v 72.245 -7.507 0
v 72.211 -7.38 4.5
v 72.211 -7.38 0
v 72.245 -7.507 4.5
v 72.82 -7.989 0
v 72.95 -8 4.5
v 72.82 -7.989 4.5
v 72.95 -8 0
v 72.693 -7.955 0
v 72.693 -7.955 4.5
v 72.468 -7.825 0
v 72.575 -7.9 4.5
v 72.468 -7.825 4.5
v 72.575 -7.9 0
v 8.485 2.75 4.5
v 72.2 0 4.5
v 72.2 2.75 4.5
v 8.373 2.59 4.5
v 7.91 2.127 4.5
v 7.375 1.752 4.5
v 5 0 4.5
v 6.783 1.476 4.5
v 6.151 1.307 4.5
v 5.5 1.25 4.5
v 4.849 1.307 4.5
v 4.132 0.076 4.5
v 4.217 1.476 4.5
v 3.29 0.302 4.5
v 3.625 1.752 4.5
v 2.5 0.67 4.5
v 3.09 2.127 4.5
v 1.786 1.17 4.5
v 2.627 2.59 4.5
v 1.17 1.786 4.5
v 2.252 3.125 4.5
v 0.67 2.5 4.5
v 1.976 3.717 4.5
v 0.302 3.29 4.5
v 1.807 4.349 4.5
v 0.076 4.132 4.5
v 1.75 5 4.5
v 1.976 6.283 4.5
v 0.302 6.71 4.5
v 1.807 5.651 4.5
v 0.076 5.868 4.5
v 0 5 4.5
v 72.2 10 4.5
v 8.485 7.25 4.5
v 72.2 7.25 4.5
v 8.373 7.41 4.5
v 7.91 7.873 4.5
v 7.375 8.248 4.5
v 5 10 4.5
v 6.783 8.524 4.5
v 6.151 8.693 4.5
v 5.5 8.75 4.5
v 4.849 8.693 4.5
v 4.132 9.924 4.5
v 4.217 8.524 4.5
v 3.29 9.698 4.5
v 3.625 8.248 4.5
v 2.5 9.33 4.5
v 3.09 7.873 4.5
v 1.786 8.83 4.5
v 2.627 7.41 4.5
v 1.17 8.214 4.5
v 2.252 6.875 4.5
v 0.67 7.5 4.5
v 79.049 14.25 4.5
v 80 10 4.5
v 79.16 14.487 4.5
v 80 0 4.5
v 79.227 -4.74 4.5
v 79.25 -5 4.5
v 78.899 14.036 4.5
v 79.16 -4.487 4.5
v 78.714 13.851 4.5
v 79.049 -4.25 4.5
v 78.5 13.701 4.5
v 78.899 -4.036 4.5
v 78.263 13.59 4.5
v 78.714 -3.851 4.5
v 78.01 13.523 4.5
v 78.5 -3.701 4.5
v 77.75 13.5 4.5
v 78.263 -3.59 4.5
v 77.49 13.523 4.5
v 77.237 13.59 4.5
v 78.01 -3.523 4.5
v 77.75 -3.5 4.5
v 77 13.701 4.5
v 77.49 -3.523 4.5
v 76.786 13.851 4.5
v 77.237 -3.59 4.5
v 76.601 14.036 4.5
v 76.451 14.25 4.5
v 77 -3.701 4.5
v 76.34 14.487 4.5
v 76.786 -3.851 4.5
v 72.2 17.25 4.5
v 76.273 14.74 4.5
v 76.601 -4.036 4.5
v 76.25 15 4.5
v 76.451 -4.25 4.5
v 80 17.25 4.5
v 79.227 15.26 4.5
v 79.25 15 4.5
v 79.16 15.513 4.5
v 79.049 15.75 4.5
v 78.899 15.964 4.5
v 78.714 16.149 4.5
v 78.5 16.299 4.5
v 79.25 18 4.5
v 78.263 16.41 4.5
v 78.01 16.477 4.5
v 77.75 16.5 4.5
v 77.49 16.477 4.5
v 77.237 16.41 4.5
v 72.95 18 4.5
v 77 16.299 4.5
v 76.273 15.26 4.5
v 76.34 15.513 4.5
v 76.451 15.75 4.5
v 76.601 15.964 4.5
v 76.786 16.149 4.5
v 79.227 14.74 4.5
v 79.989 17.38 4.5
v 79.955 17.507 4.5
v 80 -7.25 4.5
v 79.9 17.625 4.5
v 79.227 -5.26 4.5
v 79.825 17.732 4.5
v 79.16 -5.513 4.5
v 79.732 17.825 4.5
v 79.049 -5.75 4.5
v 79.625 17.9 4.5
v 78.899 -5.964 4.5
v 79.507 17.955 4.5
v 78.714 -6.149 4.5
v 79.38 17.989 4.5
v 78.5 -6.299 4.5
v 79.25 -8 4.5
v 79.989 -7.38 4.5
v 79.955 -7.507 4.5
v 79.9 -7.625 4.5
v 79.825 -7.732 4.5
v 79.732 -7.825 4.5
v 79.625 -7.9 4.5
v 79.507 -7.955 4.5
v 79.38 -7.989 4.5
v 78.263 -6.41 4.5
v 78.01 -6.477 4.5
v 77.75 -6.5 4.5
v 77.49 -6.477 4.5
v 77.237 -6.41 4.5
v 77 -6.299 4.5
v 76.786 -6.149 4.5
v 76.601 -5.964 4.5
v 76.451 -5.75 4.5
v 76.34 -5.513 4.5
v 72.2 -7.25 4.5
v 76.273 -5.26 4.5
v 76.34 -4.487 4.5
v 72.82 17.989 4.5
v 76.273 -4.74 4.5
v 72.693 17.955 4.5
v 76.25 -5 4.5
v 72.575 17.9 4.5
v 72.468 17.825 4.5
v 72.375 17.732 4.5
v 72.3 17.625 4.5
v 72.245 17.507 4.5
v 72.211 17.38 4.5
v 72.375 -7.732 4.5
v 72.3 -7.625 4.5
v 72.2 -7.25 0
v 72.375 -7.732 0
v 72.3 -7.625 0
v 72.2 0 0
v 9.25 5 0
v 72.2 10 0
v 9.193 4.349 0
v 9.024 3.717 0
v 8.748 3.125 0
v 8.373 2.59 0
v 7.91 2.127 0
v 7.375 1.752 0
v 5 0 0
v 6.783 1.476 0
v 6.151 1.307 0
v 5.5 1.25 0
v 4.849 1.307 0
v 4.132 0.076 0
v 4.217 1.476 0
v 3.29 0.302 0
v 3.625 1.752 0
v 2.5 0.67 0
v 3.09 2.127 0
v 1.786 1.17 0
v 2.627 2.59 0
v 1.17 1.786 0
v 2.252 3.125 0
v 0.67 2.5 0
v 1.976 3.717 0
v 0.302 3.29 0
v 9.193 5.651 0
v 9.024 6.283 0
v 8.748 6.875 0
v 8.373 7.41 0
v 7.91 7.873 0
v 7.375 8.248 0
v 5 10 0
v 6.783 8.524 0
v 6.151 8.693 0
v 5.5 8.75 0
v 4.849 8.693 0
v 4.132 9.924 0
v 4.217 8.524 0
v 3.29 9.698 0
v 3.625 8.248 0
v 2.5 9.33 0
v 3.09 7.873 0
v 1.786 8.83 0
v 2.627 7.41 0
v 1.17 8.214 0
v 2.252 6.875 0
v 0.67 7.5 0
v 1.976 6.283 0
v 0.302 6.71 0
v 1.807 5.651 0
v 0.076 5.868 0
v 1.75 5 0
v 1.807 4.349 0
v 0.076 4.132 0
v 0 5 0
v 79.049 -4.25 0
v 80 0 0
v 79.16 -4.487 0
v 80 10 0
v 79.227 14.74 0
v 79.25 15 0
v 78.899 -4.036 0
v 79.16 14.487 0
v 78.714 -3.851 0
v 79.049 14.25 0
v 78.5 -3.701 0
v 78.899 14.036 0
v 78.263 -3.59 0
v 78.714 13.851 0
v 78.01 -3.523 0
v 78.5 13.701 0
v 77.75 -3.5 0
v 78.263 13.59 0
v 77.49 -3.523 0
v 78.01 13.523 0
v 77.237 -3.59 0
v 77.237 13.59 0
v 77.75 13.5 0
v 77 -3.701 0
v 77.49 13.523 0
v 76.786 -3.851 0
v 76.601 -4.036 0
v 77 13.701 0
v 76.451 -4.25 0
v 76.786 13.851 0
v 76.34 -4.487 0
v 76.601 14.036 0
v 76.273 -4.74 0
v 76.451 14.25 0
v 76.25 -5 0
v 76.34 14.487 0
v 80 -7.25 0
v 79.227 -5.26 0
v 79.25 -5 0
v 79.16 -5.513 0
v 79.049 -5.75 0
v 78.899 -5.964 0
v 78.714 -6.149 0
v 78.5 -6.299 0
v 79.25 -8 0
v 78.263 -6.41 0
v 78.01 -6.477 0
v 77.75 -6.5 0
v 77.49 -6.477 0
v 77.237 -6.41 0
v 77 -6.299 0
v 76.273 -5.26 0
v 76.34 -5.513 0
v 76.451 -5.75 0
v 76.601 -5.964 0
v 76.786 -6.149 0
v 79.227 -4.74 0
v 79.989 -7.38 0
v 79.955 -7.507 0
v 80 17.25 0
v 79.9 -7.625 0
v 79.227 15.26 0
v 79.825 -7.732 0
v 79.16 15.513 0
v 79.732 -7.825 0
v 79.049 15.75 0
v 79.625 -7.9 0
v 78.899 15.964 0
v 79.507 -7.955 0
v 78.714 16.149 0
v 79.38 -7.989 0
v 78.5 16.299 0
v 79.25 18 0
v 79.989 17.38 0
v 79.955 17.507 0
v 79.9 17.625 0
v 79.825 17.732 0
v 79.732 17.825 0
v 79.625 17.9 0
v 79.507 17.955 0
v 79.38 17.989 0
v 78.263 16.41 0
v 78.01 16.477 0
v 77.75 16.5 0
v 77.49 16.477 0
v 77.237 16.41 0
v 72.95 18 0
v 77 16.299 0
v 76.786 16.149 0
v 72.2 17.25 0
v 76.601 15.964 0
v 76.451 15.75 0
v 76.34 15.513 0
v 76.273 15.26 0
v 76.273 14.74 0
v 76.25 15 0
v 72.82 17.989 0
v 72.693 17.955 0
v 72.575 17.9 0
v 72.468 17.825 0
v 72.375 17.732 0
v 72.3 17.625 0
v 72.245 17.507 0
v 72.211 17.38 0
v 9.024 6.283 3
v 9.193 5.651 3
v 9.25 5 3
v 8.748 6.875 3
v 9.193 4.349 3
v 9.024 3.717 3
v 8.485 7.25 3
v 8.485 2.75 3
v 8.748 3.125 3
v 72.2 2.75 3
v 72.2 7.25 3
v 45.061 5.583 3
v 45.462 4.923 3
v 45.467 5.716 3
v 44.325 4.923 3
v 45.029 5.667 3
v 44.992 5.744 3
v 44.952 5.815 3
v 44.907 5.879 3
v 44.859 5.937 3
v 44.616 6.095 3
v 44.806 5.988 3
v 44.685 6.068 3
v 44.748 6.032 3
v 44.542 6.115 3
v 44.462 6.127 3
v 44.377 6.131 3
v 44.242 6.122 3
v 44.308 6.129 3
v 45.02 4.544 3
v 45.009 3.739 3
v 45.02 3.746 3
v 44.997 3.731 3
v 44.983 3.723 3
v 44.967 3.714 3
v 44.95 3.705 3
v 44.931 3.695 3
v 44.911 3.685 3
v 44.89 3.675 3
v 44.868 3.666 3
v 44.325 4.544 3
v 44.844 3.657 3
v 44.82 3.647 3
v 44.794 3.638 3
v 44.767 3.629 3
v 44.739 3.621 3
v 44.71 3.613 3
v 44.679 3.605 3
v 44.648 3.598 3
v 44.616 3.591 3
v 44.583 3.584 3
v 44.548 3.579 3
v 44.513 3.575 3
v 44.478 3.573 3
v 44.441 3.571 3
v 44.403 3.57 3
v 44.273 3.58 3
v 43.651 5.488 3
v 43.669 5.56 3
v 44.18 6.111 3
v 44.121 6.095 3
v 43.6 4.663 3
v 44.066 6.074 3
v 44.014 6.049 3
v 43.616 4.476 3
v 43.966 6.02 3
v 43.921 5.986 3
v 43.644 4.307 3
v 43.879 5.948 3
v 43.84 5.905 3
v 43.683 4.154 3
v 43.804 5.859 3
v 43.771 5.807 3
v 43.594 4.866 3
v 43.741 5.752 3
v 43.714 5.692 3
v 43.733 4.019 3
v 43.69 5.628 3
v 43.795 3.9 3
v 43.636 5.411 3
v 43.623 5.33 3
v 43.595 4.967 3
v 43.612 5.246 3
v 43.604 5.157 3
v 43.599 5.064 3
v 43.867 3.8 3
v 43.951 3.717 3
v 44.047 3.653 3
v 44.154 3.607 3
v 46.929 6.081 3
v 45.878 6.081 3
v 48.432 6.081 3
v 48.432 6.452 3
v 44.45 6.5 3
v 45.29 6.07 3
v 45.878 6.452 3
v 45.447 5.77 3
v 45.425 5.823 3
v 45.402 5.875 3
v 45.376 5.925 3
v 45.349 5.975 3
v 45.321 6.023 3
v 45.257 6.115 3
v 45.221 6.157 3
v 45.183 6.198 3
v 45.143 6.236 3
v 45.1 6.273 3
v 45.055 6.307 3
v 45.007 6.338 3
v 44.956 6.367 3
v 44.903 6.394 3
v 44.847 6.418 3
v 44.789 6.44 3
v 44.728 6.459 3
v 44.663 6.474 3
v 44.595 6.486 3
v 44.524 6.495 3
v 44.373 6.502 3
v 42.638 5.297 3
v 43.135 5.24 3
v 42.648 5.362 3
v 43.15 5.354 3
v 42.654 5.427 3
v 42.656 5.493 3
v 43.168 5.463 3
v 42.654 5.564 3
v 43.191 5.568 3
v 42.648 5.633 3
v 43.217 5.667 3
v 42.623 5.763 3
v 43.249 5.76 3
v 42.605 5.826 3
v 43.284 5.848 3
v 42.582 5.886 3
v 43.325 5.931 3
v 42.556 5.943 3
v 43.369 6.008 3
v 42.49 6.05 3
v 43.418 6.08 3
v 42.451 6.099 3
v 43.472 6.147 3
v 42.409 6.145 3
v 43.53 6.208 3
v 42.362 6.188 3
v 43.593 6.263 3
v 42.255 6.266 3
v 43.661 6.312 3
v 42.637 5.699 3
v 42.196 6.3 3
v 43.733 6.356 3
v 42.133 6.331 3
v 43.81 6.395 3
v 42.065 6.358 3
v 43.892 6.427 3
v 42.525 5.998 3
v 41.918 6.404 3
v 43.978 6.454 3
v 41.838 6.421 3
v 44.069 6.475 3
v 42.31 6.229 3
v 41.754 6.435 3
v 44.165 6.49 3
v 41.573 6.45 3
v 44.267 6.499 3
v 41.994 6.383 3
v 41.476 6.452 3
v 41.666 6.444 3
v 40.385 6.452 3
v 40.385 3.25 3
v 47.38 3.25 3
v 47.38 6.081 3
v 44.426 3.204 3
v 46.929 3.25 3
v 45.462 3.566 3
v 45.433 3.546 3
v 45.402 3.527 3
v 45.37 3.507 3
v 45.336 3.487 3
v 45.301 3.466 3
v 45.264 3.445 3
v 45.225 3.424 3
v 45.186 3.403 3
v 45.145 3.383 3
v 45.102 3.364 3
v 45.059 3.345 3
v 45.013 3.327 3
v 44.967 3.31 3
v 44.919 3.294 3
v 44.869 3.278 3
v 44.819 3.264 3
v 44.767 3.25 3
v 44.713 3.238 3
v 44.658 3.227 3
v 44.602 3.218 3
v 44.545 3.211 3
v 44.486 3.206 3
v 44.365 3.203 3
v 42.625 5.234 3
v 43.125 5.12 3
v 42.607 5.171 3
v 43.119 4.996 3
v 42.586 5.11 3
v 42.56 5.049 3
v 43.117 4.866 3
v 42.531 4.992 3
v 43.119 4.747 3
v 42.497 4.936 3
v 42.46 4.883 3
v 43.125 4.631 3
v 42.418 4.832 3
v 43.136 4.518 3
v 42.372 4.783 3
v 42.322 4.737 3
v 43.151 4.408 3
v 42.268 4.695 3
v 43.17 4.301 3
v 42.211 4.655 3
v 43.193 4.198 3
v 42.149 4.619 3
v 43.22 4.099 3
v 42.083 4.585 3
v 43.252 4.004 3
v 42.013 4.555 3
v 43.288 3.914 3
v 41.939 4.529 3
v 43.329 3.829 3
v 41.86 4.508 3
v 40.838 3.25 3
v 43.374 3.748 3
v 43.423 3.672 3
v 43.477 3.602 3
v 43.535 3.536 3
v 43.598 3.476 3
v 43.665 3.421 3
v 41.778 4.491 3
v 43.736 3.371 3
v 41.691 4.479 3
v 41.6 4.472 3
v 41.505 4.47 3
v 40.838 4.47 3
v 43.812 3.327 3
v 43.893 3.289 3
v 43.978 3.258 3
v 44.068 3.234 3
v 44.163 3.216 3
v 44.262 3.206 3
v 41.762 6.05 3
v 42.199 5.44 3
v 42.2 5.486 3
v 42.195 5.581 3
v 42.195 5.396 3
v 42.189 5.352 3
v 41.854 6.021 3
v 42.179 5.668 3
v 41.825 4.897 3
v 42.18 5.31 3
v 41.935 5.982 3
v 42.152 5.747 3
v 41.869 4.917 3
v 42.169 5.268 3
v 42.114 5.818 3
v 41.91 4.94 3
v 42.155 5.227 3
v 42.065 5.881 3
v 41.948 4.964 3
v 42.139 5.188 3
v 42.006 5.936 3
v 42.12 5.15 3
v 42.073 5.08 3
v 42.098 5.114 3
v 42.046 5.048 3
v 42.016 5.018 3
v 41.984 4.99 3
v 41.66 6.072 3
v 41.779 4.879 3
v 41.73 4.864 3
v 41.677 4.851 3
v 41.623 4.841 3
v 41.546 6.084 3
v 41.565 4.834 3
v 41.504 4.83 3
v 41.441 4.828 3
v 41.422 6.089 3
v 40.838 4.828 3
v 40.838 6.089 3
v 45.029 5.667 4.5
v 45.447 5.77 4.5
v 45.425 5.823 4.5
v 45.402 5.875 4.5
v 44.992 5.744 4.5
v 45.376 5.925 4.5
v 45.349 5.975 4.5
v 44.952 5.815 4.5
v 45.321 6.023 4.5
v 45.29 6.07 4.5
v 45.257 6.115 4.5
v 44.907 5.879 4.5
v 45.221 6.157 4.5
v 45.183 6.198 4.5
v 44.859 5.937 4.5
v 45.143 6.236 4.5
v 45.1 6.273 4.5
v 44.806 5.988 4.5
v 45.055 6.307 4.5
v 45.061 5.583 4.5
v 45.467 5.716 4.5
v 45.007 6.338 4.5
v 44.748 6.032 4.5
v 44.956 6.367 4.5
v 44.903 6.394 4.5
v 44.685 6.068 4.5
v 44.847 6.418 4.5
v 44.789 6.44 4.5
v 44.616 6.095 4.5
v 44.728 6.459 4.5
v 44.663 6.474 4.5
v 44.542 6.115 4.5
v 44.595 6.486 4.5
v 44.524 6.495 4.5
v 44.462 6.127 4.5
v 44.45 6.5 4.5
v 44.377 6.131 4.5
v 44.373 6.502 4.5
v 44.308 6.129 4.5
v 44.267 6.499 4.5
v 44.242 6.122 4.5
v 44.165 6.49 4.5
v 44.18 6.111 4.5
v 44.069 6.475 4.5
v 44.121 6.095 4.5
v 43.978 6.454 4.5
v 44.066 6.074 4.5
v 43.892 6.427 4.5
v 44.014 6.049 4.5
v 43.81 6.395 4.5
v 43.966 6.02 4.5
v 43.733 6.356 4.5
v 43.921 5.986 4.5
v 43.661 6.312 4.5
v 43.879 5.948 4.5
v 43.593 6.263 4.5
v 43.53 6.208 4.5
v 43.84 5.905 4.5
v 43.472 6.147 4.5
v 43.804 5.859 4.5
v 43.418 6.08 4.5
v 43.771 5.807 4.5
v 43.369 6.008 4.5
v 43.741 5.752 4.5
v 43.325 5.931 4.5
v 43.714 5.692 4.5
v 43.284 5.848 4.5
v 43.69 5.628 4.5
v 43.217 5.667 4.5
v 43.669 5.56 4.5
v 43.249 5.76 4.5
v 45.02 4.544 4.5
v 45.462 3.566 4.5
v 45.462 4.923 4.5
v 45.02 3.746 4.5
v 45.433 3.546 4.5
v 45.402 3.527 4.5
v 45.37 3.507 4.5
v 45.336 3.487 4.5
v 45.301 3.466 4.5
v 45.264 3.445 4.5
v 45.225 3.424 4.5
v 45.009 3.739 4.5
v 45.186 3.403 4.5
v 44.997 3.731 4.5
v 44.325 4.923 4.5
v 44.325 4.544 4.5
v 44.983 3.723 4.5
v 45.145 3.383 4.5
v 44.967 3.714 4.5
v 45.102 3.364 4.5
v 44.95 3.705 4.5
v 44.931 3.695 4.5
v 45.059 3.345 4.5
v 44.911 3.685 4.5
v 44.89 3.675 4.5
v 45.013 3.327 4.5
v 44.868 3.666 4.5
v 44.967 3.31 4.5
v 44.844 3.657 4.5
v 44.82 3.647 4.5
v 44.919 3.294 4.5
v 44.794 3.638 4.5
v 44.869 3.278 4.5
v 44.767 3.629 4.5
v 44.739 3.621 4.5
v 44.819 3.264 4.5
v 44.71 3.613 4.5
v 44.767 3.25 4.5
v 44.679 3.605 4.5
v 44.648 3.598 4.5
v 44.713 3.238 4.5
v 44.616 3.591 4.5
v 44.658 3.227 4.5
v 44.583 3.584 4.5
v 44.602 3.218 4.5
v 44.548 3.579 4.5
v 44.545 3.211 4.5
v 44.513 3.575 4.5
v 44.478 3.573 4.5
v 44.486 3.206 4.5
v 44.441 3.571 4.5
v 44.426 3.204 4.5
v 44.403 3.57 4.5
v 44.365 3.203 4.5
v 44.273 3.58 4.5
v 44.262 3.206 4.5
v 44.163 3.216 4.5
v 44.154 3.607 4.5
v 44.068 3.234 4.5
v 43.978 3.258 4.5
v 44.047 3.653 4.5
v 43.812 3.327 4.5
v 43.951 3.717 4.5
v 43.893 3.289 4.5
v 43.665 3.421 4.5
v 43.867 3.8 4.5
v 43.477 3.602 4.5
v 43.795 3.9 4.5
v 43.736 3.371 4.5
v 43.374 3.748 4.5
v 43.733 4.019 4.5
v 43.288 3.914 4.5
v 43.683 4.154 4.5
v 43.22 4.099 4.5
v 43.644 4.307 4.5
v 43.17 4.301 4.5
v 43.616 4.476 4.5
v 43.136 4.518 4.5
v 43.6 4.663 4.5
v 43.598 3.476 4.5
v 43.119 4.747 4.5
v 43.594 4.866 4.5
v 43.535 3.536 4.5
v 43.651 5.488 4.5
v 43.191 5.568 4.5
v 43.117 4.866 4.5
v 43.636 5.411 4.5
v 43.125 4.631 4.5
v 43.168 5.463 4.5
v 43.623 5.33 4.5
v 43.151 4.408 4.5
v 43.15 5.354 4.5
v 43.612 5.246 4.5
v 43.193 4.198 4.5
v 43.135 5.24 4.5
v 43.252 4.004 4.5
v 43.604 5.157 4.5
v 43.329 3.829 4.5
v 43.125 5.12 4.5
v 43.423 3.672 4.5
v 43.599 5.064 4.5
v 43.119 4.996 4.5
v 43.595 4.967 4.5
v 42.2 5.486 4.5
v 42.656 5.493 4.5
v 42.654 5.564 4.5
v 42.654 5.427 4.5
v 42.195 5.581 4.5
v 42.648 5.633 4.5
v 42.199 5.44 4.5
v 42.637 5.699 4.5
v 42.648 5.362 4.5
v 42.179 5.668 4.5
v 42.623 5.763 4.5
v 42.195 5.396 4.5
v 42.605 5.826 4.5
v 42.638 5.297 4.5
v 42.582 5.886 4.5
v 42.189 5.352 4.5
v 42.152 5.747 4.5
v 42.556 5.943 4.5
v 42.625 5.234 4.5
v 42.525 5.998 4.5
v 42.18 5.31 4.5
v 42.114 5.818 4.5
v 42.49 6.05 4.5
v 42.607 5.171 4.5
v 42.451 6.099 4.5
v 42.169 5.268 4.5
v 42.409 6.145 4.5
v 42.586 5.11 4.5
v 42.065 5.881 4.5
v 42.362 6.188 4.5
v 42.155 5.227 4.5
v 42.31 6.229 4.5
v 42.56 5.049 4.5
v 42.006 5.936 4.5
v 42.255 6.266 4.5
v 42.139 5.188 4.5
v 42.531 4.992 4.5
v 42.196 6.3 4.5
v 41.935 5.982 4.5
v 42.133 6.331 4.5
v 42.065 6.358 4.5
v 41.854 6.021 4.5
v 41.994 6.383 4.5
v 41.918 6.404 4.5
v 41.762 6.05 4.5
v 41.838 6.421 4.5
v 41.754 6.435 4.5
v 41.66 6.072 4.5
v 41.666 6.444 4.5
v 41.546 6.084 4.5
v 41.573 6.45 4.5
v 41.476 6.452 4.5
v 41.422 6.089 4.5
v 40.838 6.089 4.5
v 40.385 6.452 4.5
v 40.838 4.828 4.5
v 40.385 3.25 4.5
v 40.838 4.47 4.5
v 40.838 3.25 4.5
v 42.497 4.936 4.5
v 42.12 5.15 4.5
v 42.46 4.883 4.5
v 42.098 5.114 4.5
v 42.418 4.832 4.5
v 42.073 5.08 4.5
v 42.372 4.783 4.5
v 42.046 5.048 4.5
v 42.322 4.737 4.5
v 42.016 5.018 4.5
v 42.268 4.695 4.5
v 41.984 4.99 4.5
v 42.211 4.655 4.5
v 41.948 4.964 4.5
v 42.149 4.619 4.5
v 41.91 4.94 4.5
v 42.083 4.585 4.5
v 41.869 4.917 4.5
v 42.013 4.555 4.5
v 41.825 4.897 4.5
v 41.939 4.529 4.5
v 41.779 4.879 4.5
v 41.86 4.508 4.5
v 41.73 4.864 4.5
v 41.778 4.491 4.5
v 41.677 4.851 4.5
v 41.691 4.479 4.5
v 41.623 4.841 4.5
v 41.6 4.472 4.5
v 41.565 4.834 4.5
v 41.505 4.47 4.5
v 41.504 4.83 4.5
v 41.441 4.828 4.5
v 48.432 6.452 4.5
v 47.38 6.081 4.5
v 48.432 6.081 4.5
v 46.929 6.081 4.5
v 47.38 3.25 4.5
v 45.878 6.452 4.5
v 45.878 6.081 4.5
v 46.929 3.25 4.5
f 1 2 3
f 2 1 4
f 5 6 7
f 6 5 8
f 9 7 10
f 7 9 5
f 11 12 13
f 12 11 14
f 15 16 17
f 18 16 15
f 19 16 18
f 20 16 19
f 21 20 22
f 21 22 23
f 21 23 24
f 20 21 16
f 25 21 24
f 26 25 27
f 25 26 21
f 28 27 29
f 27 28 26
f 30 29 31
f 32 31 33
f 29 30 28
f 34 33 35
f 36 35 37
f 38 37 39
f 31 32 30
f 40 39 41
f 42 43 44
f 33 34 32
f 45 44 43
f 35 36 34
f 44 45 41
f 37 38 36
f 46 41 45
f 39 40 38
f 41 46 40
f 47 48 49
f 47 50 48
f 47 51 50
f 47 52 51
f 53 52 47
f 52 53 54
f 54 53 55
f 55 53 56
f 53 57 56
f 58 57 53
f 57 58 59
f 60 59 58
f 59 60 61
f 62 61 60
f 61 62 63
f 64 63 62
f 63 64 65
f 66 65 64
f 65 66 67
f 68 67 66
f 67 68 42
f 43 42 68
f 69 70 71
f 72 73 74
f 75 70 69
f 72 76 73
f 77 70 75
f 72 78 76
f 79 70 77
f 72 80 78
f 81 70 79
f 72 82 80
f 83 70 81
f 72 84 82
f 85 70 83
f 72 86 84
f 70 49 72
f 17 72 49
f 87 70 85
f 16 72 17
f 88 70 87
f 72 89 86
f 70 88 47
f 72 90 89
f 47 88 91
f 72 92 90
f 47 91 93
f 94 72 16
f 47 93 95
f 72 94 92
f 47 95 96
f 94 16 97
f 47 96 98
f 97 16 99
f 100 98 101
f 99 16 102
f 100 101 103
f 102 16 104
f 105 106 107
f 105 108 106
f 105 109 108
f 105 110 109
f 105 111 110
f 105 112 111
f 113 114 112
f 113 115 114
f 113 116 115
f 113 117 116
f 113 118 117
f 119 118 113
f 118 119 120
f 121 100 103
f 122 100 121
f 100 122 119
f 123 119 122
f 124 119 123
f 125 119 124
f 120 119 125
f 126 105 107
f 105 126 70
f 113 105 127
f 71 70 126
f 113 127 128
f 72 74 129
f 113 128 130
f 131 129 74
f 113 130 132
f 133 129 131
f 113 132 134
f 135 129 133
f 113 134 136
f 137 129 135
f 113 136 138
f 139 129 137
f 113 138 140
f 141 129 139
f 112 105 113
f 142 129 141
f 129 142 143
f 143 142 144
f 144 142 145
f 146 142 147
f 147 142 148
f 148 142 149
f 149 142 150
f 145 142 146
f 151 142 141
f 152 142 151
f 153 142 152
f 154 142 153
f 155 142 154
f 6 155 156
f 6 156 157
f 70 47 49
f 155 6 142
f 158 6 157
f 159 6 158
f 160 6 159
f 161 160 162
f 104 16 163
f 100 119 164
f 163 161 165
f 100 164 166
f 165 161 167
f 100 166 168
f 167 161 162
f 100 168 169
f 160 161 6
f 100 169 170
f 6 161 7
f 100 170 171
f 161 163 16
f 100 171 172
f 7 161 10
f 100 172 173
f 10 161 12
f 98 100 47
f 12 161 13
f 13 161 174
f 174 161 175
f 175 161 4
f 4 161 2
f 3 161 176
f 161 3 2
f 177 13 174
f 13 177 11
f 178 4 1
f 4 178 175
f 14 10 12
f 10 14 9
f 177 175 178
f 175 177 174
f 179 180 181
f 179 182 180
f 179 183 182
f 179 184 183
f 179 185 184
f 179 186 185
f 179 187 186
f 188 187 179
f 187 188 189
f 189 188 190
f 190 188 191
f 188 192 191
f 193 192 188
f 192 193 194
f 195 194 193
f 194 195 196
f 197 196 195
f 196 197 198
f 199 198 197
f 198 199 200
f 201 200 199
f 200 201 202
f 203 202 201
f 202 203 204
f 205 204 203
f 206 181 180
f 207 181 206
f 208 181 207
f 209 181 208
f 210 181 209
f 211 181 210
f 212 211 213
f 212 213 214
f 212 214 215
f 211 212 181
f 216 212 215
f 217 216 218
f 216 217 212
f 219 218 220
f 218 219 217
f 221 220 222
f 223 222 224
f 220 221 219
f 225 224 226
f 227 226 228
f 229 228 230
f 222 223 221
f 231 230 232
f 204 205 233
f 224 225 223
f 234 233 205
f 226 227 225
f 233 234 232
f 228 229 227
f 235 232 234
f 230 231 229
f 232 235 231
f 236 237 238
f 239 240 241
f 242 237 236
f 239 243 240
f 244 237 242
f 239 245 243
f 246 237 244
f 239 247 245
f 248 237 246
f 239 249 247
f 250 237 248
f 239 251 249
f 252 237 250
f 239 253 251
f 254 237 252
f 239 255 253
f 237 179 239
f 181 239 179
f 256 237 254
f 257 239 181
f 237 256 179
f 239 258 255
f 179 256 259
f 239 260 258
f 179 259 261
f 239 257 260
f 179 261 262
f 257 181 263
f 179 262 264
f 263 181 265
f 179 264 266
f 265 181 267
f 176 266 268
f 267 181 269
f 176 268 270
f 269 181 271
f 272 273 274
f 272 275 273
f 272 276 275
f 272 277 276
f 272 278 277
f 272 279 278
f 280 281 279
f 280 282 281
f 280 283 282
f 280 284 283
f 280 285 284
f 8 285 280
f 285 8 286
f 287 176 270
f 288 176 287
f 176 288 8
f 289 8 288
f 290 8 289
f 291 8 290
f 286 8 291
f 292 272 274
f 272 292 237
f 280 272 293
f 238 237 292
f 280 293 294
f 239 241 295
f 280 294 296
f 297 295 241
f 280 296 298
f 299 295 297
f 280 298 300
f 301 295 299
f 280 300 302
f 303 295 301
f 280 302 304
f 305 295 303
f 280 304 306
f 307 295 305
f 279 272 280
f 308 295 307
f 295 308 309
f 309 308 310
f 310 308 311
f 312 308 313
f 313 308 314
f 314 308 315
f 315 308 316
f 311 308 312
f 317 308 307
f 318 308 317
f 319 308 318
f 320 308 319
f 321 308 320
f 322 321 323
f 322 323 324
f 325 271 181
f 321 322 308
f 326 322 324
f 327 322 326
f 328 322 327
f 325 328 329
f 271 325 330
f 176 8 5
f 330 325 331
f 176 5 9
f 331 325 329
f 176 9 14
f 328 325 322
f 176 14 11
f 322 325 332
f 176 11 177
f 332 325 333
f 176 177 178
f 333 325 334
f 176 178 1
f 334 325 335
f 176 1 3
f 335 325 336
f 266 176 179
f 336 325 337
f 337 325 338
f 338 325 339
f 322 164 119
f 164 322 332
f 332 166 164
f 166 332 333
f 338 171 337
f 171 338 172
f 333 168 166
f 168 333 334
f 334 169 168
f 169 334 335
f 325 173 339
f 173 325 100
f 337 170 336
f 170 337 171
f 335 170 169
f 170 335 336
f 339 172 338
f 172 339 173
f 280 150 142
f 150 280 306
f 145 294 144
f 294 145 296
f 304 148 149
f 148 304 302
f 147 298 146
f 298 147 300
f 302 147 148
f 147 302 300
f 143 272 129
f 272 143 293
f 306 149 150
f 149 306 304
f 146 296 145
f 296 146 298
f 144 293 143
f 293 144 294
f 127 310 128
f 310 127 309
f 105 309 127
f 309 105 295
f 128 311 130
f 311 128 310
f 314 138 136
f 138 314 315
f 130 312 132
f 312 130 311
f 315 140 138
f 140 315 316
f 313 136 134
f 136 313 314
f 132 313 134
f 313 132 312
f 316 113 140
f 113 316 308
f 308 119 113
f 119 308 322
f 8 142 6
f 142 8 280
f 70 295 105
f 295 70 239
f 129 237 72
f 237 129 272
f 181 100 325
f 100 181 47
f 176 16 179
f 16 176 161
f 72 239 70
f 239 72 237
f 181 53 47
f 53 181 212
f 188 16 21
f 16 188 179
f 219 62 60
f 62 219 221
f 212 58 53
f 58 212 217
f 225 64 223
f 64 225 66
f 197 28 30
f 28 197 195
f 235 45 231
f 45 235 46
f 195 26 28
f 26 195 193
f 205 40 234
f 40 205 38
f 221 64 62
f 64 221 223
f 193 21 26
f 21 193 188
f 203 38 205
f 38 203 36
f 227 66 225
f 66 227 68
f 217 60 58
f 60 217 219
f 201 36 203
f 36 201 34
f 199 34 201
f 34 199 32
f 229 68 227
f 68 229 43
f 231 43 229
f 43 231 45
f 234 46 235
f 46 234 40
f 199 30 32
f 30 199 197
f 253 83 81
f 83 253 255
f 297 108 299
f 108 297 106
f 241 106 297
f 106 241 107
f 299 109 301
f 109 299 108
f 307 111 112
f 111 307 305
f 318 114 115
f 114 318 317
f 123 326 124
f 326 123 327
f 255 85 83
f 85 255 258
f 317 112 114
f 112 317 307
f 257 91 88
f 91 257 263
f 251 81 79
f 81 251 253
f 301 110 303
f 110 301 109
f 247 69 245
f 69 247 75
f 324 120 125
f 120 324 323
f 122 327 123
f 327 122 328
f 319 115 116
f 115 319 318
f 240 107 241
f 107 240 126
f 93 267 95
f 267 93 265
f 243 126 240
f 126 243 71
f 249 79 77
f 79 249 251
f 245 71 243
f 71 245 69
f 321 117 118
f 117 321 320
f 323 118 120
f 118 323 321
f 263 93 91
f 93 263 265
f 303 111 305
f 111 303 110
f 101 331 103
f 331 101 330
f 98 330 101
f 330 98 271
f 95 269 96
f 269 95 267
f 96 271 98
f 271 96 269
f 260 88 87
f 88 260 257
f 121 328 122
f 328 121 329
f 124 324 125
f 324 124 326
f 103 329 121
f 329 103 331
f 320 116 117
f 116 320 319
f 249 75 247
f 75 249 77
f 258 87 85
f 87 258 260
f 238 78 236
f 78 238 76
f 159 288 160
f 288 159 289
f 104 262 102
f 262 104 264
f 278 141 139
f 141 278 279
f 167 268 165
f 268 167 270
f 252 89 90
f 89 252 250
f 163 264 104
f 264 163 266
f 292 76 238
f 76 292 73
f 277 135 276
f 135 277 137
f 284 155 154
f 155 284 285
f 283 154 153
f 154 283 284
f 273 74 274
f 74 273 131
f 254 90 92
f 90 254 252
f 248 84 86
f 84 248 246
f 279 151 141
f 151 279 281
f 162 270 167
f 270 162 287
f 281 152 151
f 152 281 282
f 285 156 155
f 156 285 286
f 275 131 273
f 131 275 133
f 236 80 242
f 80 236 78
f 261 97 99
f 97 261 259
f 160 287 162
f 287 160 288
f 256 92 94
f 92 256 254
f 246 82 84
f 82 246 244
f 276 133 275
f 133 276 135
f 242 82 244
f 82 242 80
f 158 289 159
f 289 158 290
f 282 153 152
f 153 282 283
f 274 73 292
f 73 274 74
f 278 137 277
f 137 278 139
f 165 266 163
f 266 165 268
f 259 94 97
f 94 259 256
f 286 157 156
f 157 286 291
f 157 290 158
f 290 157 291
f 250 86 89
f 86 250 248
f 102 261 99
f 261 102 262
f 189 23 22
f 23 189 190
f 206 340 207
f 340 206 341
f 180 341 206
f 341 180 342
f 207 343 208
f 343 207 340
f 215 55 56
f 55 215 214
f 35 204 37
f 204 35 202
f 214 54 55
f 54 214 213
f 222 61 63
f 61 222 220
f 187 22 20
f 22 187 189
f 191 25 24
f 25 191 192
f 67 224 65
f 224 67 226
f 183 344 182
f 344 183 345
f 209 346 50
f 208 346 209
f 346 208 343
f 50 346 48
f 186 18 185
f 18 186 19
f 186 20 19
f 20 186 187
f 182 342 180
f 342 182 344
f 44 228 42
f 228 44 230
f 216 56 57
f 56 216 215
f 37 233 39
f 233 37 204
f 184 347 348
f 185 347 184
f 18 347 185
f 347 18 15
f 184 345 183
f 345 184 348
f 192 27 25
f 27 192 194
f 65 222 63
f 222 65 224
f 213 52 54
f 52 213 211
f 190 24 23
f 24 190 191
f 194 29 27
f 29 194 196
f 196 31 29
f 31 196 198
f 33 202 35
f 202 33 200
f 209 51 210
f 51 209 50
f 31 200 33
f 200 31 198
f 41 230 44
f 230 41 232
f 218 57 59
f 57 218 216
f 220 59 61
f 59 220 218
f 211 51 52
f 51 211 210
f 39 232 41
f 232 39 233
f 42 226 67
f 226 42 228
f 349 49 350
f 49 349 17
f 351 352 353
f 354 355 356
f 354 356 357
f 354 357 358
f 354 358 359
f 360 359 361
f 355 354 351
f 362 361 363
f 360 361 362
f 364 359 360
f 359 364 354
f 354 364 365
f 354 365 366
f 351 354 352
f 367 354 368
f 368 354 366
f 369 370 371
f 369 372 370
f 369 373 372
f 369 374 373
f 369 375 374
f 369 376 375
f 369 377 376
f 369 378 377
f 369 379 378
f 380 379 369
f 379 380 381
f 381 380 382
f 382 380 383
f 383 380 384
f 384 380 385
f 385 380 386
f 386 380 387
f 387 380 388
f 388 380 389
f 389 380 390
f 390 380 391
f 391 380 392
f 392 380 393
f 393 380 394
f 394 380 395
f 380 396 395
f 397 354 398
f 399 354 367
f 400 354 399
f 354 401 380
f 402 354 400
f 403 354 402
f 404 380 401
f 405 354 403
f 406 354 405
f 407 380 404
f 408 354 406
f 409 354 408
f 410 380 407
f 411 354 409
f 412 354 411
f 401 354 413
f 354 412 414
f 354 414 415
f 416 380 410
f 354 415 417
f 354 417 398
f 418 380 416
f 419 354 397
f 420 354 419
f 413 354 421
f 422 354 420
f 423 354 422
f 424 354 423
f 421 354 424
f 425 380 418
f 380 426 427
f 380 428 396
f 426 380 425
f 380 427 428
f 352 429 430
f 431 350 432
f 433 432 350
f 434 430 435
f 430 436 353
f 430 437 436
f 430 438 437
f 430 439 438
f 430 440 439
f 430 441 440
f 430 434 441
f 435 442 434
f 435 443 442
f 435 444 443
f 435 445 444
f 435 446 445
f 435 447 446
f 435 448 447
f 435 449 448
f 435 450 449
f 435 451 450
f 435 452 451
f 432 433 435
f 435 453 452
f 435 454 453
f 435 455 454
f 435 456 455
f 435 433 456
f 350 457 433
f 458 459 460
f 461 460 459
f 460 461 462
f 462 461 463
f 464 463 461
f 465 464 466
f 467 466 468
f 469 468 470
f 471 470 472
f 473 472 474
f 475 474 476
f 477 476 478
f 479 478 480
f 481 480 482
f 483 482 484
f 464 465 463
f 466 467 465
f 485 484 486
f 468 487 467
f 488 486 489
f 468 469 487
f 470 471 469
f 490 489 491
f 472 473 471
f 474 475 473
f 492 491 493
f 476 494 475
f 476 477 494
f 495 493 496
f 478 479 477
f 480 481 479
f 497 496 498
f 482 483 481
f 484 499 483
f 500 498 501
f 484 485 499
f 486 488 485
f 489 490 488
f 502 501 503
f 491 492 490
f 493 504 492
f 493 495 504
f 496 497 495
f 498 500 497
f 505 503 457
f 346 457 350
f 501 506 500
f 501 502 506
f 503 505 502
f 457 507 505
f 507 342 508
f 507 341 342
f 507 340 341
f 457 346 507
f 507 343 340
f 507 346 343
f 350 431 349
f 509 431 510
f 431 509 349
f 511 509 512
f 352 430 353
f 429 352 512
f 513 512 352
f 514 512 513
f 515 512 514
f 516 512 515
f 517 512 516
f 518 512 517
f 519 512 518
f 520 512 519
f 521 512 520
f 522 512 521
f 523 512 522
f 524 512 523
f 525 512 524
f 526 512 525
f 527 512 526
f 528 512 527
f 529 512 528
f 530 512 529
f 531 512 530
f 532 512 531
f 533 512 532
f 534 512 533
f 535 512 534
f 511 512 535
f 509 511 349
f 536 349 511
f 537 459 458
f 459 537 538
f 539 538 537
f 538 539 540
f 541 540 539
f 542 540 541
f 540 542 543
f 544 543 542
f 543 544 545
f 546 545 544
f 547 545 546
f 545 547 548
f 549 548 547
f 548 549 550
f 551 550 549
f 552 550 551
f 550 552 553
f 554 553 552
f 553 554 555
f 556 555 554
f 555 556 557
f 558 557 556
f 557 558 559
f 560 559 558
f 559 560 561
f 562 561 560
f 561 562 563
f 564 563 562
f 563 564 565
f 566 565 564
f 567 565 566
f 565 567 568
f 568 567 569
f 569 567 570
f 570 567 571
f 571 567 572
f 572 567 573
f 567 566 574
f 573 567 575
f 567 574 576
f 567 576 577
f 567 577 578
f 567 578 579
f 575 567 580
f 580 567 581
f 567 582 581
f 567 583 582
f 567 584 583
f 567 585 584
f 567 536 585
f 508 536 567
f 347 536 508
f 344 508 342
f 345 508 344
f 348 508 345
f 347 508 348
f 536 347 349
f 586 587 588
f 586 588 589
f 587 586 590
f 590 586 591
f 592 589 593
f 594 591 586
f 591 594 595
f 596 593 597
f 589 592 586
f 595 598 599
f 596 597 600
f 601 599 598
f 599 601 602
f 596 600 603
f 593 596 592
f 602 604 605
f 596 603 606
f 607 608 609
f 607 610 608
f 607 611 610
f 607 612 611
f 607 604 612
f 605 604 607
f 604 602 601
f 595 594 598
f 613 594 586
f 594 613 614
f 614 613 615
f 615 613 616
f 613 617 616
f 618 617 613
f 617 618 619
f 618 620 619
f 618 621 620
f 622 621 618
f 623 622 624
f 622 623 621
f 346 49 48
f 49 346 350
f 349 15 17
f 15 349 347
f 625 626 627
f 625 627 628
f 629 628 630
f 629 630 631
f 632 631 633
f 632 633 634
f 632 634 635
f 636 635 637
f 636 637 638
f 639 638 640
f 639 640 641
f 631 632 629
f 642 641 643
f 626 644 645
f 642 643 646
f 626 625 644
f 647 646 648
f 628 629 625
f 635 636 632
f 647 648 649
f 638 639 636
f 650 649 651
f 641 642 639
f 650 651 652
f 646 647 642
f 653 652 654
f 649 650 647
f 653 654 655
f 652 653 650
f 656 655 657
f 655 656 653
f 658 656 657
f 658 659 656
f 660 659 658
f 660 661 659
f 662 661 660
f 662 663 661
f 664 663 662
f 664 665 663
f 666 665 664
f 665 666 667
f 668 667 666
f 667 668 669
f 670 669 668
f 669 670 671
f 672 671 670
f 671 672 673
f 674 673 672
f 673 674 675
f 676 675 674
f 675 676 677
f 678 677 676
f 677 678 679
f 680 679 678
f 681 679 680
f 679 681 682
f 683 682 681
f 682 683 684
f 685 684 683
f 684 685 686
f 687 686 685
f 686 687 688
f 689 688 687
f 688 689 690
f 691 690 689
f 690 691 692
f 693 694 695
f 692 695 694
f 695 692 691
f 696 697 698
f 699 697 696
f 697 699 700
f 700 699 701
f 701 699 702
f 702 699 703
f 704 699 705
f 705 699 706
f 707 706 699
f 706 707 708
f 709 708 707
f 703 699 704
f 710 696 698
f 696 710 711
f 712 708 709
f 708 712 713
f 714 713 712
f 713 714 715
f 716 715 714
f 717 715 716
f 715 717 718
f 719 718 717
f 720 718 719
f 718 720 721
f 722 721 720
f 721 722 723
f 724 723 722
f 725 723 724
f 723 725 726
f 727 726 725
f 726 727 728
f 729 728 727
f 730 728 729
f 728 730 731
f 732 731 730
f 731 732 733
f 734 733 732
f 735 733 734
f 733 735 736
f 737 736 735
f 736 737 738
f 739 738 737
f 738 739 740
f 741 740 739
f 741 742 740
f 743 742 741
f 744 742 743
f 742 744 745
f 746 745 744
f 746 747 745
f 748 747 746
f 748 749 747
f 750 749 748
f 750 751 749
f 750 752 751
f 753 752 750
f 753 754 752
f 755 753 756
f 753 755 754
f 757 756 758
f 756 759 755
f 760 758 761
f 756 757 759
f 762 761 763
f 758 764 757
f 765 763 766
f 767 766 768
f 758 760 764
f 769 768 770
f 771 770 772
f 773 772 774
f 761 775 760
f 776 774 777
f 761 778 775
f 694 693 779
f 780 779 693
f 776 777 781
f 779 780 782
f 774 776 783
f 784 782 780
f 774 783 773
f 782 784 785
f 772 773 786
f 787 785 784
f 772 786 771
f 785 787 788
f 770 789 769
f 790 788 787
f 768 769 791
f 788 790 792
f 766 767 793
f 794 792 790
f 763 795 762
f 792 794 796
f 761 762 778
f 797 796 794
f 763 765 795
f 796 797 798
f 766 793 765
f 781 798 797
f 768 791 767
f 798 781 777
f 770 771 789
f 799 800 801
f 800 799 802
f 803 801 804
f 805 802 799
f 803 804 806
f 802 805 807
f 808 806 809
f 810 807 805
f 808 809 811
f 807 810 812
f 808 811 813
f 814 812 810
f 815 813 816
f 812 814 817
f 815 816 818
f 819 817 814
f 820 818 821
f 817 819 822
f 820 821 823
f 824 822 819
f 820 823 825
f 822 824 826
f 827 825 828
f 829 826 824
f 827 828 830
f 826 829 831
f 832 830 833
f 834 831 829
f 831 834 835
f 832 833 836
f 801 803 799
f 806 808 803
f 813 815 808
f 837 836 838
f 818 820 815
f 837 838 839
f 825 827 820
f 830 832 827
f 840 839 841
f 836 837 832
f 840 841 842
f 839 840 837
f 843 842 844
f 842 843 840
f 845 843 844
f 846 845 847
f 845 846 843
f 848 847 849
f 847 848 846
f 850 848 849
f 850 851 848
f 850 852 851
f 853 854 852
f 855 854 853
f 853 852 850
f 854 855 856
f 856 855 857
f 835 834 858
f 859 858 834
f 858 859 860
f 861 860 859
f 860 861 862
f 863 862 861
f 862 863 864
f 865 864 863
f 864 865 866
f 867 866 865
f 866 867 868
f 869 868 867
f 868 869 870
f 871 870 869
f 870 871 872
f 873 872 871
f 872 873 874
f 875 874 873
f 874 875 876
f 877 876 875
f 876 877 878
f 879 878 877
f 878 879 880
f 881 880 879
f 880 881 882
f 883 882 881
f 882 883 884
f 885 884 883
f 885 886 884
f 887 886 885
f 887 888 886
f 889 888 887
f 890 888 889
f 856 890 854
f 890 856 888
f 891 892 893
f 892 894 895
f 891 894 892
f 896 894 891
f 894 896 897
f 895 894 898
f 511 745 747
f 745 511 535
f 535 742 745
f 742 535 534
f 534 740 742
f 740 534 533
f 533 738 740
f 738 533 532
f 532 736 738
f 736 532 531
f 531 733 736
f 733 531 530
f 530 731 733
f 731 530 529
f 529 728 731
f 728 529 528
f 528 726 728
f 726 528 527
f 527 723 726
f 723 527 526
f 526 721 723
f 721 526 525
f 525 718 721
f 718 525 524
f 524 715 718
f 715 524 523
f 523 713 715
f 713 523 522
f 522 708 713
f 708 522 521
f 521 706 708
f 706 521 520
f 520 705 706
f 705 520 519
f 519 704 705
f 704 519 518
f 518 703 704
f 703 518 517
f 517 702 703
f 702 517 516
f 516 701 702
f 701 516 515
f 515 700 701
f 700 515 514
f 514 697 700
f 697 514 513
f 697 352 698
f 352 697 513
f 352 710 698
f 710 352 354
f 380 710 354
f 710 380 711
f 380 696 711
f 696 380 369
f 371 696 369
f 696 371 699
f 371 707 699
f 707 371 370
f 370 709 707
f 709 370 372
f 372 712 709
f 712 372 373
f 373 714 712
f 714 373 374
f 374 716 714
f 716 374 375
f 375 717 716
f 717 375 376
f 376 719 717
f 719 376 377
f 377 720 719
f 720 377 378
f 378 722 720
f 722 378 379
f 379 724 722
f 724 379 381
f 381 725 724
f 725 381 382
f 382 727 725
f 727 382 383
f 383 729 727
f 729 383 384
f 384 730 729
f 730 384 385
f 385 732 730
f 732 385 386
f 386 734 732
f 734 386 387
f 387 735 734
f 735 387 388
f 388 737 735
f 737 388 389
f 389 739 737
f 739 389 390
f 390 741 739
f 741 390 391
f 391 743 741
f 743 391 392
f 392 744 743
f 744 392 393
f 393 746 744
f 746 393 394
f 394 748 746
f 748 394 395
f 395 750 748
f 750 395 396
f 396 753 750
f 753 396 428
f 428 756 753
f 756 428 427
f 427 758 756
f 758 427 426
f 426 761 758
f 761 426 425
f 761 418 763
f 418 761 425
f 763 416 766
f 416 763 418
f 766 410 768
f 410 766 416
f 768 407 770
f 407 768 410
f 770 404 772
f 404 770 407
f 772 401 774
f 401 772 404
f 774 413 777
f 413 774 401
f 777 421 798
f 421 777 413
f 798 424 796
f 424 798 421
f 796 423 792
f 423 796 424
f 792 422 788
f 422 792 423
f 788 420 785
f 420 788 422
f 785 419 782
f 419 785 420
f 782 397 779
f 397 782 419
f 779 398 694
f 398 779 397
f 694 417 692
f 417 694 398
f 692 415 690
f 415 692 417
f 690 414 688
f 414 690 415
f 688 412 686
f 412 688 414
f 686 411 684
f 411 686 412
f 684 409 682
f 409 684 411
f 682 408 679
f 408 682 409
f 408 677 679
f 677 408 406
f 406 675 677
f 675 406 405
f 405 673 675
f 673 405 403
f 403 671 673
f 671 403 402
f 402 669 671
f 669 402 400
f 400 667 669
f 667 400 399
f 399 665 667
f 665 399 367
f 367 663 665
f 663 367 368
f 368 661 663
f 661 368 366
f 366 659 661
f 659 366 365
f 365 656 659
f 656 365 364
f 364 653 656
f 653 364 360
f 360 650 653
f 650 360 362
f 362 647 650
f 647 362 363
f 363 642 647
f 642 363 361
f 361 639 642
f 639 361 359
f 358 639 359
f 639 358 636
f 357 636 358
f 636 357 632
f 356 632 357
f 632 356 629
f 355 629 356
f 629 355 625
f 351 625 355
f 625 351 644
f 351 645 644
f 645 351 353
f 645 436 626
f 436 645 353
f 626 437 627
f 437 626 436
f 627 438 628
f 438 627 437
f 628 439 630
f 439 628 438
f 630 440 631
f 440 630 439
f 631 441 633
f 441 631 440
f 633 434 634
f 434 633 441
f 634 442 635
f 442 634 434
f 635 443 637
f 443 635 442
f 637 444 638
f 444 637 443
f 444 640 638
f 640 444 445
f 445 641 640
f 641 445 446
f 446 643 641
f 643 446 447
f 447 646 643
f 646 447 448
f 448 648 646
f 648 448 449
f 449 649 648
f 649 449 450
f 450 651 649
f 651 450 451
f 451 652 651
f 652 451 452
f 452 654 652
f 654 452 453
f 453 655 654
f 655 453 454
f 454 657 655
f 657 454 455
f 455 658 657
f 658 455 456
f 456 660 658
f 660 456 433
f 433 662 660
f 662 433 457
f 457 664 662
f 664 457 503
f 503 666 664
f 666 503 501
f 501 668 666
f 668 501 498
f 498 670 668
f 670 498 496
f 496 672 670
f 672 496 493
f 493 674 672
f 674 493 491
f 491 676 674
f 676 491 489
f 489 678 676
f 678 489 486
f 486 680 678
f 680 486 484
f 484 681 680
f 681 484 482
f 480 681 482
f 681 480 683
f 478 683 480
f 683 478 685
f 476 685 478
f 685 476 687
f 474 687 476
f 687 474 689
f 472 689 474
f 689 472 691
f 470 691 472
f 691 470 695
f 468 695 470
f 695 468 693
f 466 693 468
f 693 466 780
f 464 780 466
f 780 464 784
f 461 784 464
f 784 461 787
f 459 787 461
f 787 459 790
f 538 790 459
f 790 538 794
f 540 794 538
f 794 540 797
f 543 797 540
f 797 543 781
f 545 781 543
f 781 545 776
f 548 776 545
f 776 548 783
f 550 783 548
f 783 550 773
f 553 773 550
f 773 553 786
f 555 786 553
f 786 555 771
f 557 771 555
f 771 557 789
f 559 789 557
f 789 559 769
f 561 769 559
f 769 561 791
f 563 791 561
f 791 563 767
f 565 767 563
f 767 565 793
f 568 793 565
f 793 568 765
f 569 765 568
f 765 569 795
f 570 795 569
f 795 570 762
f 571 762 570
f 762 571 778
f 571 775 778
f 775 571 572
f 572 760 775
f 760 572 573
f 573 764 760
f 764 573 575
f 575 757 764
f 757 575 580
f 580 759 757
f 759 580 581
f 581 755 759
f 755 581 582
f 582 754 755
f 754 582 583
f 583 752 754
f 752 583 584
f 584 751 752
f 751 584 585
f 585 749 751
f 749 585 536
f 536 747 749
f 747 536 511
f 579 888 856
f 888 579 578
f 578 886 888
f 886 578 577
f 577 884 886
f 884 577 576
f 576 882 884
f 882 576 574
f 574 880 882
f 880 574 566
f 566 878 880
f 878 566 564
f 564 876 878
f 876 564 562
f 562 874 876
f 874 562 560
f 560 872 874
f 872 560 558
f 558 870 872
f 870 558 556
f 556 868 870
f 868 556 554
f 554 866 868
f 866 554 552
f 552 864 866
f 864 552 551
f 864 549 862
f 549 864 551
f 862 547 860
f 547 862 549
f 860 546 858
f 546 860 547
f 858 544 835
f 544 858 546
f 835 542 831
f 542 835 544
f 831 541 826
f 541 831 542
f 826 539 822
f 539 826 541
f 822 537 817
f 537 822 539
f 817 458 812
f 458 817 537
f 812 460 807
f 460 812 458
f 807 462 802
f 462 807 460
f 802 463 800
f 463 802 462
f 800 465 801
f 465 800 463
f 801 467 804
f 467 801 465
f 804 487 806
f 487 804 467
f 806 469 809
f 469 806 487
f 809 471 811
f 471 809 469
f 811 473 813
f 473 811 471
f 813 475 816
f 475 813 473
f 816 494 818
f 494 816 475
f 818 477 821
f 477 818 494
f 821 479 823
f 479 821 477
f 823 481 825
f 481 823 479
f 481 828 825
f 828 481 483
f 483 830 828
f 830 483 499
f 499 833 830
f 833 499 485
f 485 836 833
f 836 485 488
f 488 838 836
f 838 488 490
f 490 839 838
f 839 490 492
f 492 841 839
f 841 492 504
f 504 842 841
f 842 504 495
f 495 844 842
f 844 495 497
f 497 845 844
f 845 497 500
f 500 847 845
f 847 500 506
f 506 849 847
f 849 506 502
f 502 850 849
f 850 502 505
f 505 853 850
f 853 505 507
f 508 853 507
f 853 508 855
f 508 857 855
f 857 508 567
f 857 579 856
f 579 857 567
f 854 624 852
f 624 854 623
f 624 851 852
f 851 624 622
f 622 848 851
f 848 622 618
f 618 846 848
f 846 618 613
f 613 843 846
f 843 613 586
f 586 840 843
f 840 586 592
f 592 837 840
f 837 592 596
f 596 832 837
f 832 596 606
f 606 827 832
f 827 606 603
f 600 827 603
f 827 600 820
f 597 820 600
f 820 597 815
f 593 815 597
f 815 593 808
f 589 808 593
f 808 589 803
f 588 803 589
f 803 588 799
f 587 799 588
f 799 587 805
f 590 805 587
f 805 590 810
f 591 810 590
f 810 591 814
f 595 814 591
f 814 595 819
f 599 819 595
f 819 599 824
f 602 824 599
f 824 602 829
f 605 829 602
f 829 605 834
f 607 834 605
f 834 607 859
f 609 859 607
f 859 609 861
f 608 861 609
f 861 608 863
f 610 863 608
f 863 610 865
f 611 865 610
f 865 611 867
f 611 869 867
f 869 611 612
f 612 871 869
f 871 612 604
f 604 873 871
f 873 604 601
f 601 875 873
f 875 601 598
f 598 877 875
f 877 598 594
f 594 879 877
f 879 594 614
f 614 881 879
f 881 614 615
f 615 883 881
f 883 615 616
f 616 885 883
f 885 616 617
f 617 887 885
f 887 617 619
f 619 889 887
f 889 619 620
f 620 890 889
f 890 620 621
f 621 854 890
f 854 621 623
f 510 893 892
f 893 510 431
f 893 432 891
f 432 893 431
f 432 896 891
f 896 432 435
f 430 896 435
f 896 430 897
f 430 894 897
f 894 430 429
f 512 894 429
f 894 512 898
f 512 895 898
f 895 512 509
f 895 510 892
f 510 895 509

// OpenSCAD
include <MCAD/boxes.scad>;
include <MCAD/triangles.scad>;
include <text_on.scad>

$fn=36;

l_arm = 80;
w_arm = 10;
h_arm = 4.5;

r_servo_axle = 3.4+0.35;
l_servo_horn = 28;

l_switch = 7.5+0.3;
w_switch = 26;
x_switch = l_arm-l_switch;
y_switch = w_arm/2-w_switch/2;

l_horn_slot = l_arm-w_arm/2-l_switch;
w_horn_slot = 4.5;
y_horn_slot = w_arm/2-w_horn_slot/2;
z_horn_slot = h_arm-1.5; // 1.5 is height of horn

r_screw = 3/2; //m3
y_screw = 23/2-r_screw;

difference(){
  union(){
    //arm body
    translate([w_arm/2,0,0])
      cube([l_arm-w_arm/2,w_arm,h_arm]);
    //servo to arm area
    translate([w_arm/2,w_arm/2,0])
      cylinder(r=w_arm/2,h=h_arm);
    //switch
    translate([x_switch+l_switch/2,y_switch+w_switch/2,h_arm/2])
      // cube([l_switch,w_switch,h_arm]);
    roundedBox([l_switch,w_switch,h_arm],0.75,true);
  }
  //servo horn axle
  translate([w_arm/2+0.5,w_arm/2,0])
    cylinder(r=r_servo_axle,h=h_arm);
  
  //horn slot on arm
  translate([w_arm/2,y_horn_slot,z_horn_slot])
    cube([l_horn_slot,w_horn_slot,h_arm]);

  //m3 screw holes
  translate([l_arm-r_screw-0.75,w_arm/2,0]){
    translate([0,y_screw,0])
      cylinder(r=r_screw, h=h_arm);
    mirror([0,1,0])
      translate([0,y_screw,0])
      cylinder(r=r_screw, h=h_arm);
  }
}
translate([l_arm/2,w_arm/2-3.5/2,z_horn_slot])
  text_extrude("PGT",size=3.5,extrusion_height=h_arm-z_horn_slot, center=false);


module iso_triangle(){
}
